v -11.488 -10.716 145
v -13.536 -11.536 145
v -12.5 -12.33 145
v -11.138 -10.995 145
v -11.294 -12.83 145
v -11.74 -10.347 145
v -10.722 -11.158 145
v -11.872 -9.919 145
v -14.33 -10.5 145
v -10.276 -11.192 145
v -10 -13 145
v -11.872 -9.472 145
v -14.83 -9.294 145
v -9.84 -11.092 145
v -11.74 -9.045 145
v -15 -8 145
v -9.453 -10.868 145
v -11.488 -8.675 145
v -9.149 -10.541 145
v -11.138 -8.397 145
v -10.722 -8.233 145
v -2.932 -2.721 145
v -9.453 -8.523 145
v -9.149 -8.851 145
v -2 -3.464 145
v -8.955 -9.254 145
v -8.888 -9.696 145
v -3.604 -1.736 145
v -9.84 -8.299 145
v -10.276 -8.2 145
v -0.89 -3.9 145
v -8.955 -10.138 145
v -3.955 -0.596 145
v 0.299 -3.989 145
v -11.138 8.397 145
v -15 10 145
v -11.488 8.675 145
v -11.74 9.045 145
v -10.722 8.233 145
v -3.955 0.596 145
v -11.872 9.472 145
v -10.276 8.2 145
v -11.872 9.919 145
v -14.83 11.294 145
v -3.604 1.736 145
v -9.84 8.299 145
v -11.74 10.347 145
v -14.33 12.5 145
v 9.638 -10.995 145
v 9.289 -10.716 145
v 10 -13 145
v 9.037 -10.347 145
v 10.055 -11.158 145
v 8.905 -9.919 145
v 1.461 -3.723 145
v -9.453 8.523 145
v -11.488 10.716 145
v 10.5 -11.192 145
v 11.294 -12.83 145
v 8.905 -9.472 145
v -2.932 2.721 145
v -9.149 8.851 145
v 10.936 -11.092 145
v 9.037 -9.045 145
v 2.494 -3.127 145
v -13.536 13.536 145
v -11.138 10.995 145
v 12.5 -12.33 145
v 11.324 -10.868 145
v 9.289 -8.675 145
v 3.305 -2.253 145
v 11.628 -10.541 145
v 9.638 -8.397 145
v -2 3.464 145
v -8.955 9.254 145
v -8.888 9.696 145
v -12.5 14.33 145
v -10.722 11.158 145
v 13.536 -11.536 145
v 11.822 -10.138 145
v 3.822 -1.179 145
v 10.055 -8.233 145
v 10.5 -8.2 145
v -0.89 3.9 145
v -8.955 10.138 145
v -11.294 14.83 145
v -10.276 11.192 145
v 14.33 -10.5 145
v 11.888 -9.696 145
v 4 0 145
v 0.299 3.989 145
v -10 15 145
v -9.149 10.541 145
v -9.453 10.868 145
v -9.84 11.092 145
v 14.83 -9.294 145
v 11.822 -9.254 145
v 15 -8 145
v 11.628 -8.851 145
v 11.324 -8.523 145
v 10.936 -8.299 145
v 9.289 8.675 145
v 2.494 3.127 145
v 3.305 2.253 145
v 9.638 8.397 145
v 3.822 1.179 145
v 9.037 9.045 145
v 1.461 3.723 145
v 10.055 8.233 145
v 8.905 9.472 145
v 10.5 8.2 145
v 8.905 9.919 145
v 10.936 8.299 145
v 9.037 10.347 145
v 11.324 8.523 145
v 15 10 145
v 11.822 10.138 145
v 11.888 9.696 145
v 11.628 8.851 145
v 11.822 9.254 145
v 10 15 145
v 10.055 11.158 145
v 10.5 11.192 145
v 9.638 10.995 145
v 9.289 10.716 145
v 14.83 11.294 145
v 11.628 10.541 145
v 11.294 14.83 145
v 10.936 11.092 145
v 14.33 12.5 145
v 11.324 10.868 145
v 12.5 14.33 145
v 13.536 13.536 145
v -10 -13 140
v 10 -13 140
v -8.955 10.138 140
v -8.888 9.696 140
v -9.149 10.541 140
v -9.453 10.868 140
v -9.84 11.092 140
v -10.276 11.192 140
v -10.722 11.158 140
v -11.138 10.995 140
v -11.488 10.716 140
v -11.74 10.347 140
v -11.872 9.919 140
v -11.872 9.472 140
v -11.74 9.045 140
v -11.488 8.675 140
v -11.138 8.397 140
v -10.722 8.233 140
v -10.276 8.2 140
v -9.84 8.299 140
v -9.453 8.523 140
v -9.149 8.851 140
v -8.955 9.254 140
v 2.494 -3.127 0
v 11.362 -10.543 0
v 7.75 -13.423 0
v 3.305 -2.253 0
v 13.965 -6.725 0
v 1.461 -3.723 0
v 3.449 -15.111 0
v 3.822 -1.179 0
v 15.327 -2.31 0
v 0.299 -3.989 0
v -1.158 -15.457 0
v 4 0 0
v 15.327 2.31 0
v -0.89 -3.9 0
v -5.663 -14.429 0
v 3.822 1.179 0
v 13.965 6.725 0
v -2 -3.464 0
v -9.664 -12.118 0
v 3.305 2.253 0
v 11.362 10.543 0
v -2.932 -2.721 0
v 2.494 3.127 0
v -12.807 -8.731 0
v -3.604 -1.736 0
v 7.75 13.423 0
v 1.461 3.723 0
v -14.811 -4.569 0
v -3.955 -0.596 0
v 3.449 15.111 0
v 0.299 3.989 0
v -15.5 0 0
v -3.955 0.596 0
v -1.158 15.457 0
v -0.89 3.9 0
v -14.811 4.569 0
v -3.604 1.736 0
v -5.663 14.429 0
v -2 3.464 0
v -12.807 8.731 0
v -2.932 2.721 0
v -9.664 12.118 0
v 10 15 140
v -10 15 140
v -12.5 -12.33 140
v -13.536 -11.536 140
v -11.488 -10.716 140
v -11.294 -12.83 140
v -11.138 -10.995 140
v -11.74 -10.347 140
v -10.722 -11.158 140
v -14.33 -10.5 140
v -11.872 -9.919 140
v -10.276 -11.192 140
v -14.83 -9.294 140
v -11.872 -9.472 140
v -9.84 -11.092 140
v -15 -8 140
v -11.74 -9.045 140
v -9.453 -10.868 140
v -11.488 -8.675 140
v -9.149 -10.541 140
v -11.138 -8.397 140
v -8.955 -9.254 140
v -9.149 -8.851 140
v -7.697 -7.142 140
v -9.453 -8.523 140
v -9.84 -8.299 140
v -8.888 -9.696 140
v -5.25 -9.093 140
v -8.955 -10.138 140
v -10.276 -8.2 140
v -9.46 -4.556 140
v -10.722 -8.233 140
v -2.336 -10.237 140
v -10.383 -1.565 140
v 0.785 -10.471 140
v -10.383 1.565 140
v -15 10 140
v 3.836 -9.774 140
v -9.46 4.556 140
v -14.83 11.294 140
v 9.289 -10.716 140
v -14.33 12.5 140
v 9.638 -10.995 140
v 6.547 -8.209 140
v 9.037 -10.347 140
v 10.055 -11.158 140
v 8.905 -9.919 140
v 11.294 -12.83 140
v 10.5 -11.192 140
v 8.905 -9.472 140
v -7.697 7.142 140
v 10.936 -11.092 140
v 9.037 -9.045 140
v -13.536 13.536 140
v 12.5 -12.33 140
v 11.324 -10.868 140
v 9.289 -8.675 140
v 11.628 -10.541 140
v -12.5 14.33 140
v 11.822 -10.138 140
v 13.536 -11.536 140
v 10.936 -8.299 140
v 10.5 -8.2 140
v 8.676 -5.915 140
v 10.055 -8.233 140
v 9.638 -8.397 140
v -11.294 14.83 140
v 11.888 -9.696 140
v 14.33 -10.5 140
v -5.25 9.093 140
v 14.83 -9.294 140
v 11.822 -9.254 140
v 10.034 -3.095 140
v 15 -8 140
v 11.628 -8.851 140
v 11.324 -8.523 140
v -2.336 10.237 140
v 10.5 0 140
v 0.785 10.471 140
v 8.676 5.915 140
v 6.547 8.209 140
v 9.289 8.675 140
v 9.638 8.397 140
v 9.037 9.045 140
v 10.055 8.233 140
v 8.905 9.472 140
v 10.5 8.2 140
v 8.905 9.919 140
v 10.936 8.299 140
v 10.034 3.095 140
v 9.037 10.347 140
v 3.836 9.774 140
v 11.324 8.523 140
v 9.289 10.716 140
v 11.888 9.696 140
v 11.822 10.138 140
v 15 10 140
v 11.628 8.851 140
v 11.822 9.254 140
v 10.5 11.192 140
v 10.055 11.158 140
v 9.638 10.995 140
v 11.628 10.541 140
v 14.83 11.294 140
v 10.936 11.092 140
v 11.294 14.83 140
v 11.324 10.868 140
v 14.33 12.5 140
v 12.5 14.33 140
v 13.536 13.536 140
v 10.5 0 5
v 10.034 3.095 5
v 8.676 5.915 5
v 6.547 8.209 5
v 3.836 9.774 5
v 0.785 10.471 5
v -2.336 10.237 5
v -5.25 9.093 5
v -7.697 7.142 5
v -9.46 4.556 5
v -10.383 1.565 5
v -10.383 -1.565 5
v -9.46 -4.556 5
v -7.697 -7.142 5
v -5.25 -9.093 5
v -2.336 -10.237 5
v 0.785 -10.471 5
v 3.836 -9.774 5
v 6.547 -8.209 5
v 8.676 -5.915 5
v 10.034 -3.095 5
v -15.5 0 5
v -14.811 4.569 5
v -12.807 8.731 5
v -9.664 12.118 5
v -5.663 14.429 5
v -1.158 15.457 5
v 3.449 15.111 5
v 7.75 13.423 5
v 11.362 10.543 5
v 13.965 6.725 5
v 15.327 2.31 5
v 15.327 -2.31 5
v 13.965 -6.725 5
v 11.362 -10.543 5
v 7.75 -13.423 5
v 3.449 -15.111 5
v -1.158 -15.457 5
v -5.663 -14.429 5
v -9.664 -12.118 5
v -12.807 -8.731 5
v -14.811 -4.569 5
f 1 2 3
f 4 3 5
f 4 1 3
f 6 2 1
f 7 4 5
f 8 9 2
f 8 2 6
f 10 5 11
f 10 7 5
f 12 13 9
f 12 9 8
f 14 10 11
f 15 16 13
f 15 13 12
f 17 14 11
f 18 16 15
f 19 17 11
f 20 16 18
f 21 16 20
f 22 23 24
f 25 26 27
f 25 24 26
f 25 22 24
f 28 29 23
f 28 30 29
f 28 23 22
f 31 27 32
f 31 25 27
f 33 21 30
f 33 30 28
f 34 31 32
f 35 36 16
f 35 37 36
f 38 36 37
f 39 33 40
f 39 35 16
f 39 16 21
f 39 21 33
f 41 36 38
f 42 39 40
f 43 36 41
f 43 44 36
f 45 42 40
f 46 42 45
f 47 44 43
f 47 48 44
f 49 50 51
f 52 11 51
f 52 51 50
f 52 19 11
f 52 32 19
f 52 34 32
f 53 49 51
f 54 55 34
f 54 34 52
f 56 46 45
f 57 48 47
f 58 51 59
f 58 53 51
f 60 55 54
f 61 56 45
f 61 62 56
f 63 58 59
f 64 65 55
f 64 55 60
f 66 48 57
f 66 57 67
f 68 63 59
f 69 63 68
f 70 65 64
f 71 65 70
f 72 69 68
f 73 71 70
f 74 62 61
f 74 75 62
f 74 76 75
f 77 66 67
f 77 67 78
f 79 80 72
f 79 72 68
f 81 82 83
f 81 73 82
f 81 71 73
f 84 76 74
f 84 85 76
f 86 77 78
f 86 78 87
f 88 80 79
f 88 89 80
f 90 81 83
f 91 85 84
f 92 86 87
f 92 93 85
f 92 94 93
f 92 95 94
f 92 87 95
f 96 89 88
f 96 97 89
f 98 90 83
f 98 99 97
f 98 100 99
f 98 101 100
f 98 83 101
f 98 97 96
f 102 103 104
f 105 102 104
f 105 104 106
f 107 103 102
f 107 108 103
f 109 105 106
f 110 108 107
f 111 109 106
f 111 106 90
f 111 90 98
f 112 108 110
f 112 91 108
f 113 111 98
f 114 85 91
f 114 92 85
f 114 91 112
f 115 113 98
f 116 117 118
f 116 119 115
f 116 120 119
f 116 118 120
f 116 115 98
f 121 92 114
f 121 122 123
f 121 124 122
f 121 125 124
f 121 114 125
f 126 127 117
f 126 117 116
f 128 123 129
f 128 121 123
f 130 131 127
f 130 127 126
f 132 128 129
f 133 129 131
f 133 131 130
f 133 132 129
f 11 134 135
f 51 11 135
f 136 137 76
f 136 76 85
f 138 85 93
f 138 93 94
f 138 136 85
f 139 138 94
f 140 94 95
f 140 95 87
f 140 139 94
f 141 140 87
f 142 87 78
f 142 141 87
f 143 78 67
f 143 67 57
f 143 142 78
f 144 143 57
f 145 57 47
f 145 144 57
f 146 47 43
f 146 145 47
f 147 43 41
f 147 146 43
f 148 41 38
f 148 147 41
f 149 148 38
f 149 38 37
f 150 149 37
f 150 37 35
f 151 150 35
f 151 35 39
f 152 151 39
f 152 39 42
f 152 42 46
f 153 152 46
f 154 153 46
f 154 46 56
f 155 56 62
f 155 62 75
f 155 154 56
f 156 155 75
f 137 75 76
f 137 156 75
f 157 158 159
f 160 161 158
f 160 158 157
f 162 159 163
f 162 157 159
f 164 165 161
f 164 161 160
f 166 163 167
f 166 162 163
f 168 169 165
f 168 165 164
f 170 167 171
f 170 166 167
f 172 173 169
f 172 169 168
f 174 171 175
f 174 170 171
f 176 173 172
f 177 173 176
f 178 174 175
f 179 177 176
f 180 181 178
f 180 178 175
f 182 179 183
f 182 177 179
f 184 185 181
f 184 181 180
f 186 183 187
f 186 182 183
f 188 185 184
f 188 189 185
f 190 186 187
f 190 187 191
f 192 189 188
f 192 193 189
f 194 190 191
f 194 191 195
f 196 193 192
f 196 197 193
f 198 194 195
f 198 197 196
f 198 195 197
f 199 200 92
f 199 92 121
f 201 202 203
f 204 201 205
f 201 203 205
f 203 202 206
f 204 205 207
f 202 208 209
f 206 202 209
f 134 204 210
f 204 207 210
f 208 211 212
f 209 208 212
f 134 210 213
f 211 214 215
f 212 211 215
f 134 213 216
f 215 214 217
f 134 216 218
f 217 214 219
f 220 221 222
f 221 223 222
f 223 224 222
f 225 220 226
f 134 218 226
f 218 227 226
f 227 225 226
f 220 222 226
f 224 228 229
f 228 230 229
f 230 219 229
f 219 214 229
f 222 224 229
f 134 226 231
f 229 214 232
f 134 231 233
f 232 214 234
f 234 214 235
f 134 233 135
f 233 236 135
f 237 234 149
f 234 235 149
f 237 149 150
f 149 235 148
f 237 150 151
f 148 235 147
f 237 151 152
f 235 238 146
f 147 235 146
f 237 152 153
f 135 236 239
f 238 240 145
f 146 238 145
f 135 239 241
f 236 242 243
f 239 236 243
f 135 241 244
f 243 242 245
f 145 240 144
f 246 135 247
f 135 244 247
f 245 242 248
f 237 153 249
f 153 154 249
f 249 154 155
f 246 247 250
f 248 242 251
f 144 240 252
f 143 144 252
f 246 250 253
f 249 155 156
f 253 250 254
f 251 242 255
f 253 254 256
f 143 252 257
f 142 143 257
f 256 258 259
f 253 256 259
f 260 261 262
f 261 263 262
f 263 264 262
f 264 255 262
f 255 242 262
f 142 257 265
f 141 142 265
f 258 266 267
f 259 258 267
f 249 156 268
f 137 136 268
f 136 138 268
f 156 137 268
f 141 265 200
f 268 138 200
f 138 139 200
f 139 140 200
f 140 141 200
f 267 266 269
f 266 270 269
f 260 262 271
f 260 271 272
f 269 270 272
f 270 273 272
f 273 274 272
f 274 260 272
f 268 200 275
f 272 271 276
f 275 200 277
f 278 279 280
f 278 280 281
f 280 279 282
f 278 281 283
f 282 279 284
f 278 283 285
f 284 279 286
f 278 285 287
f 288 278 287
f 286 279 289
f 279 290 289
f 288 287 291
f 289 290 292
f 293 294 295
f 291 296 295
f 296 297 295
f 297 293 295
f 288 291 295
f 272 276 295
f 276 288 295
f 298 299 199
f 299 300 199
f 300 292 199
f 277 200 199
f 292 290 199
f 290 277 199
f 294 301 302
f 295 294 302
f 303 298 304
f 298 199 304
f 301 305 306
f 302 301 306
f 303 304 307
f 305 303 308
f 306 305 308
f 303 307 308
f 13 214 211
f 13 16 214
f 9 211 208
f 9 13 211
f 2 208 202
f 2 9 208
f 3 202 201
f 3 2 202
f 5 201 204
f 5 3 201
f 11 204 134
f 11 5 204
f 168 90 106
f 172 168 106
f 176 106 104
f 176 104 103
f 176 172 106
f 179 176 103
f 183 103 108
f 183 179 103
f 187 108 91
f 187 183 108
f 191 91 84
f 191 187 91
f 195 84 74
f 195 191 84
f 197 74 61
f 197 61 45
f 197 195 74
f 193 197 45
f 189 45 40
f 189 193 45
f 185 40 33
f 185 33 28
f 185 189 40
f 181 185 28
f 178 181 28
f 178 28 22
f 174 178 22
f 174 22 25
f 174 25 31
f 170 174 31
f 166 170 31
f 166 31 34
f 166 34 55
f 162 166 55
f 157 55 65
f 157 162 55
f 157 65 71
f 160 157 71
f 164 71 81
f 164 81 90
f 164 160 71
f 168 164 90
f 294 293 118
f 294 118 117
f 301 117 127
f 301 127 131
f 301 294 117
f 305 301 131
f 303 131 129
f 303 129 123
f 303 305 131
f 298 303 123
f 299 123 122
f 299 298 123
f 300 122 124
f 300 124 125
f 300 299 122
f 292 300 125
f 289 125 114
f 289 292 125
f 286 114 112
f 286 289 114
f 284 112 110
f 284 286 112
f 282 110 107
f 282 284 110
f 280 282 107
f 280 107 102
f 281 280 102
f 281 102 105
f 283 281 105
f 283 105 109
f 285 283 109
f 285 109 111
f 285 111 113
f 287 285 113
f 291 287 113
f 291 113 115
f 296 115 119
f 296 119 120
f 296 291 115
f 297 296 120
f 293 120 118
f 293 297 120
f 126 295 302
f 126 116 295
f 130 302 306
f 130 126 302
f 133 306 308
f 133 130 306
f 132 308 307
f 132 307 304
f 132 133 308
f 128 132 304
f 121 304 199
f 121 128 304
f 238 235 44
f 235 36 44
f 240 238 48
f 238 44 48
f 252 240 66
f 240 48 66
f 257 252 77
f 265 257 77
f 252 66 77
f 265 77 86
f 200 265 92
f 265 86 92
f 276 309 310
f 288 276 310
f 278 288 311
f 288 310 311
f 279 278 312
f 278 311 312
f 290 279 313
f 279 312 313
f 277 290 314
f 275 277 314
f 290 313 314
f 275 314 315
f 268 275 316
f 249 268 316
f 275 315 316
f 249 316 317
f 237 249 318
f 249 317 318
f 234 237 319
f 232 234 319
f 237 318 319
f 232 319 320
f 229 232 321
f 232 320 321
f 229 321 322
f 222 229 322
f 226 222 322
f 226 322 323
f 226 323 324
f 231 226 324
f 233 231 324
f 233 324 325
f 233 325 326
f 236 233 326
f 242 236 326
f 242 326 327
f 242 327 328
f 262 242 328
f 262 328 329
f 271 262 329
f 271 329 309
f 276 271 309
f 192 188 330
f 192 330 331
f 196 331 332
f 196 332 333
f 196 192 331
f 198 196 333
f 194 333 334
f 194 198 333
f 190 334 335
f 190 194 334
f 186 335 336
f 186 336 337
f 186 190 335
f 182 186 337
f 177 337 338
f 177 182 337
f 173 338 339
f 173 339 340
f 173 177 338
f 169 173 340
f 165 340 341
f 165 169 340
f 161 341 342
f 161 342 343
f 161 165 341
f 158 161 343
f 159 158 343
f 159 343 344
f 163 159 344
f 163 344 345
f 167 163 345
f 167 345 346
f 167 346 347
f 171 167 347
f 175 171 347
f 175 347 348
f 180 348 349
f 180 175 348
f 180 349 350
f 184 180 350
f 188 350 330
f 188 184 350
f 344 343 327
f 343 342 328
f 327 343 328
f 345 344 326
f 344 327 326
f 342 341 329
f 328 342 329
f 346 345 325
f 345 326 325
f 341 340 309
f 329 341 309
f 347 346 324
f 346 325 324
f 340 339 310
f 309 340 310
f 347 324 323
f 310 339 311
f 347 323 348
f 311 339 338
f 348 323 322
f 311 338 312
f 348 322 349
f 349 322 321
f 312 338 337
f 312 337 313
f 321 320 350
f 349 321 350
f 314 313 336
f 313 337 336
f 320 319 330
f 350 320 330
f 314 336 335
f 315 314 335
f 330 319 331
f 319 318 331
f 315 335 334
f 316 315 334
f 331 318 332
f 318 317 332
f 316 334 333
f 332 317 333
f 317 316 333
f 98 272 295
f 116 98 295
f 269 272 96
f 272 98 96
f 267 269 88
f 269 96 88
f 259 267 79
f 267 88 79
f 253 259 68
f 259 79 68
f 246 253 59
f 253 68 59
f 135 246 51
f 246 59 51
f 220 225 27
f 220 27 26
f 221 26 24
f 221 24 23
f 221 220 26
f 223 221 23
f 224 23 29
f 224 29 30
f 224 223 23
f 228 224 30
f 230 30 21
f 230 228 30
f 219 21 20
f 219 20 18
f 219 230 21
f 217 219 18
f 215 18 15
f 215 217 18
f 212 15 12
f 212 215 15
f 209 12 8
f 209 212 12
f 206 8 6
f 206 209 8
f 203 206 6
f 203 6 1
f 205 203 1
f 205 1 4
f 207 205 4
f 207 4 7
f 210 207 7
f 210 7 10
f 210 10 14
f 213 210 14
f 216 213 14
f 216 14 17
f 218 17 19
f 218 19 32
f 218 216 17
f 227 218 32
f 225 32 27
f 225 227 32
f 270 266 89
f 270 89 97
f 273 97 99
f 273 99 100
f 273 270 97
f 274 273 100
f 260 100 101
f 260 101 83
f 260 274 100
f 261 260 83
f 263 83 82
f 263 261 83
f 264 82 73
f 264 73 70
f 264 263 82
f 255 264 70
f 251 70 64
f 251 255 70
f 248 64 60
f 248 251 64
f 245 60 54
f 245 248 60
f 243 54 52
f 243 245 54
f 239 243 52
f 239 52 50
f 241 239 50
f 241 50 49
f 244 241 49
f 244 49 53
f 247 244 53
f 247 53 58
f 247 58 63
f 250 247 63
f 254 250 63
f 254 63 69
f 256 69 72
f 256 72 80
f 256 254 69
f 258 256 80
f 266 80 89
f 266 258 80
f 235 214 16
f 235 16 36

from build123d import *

# Parameters (mm, degrees)
SKETCH1_R           = 10.5
SKETCH1_R_2         = 4
BOSS_EXTRUDE1_DEPTH = 140
SKETCH2_W           = 30
SKETCH2_H           = 28
SKETCH2_R           = 1.5
SKETCH2_R_2         = 4
BOSS_EXTRUDE2_DEPTH = 5
FILLET1_R           = 5
SKETCH3_R           = 15.5
SKETCH3_R_2         = 10.5
EXTRUDE_THIN1_DEPTH = 5


with BuildPart() as part:
    # Sketch1 → Boss-Extrude1 (new body)
    with BuildSketch(Plane.XY):
        Circle(SKETCH1_R)
        Circle(SKETCH1_R_2, mode=Mode.SUBTRACT)
    extrude(amount=BOSS_EXTRUDE1_DEPTH)

    # Sketch2 → Boss-Extrude2 (add)
    with BuildSketch(Plane.XY.offset(140)):
        with Locations((0, 1)):
            Rectangle(SKETCH2_W, SKETCH2_H)
        with Locations((-10.388295362, 9.695742338)):
            Circle(SKETCH2_R, mode=Mode.SUBTRACT)
        with Locations((10.388295362, -9.695742338)):
            Circle(SKETCH2_R, mode=Mode.SUBTRACT)
        with Locations((10.388295362, 9.695742338)):
            Circle(SKETCH2_R, mode=Mode.SUBTRACT)
        with Locations((-10.388295362, -9.695742338)):
            Circle(SKETCH2_R, mode=Mode.SUBTRACT)
        Circle(SKETCH2_R_2, mode=Mode.SUBTRACT)
    extrude(amount=BOSS_EXTRUDE2_DEPTH)

    # Fillet1
    fillet1_edges = [part.edges().sort_by_distance(p)[0] for p in [
        (15, -13, 142.5),
        (15, 15, 142.5),
        (-15, 15, 142.5),
        (-15, -13, 142.5),
    ]]
    fillet(fillet1_edges, radius=FILLET1_R)

    # Sketch3 → Extrude-Thin1 (add)
    with BuildSketch(Plane(origin=(0, 0, 0), x_dir=(-1, 0, 0), z_dir=(0, 0, -1))):
        Circle(SKETCH3_R)
        Circle(SKETCH3_R_2, mode=Mode.SUBTRACT)
    extrude(amount=-EXTRUDE_THIN1_DEPTH)


solid = part.part
